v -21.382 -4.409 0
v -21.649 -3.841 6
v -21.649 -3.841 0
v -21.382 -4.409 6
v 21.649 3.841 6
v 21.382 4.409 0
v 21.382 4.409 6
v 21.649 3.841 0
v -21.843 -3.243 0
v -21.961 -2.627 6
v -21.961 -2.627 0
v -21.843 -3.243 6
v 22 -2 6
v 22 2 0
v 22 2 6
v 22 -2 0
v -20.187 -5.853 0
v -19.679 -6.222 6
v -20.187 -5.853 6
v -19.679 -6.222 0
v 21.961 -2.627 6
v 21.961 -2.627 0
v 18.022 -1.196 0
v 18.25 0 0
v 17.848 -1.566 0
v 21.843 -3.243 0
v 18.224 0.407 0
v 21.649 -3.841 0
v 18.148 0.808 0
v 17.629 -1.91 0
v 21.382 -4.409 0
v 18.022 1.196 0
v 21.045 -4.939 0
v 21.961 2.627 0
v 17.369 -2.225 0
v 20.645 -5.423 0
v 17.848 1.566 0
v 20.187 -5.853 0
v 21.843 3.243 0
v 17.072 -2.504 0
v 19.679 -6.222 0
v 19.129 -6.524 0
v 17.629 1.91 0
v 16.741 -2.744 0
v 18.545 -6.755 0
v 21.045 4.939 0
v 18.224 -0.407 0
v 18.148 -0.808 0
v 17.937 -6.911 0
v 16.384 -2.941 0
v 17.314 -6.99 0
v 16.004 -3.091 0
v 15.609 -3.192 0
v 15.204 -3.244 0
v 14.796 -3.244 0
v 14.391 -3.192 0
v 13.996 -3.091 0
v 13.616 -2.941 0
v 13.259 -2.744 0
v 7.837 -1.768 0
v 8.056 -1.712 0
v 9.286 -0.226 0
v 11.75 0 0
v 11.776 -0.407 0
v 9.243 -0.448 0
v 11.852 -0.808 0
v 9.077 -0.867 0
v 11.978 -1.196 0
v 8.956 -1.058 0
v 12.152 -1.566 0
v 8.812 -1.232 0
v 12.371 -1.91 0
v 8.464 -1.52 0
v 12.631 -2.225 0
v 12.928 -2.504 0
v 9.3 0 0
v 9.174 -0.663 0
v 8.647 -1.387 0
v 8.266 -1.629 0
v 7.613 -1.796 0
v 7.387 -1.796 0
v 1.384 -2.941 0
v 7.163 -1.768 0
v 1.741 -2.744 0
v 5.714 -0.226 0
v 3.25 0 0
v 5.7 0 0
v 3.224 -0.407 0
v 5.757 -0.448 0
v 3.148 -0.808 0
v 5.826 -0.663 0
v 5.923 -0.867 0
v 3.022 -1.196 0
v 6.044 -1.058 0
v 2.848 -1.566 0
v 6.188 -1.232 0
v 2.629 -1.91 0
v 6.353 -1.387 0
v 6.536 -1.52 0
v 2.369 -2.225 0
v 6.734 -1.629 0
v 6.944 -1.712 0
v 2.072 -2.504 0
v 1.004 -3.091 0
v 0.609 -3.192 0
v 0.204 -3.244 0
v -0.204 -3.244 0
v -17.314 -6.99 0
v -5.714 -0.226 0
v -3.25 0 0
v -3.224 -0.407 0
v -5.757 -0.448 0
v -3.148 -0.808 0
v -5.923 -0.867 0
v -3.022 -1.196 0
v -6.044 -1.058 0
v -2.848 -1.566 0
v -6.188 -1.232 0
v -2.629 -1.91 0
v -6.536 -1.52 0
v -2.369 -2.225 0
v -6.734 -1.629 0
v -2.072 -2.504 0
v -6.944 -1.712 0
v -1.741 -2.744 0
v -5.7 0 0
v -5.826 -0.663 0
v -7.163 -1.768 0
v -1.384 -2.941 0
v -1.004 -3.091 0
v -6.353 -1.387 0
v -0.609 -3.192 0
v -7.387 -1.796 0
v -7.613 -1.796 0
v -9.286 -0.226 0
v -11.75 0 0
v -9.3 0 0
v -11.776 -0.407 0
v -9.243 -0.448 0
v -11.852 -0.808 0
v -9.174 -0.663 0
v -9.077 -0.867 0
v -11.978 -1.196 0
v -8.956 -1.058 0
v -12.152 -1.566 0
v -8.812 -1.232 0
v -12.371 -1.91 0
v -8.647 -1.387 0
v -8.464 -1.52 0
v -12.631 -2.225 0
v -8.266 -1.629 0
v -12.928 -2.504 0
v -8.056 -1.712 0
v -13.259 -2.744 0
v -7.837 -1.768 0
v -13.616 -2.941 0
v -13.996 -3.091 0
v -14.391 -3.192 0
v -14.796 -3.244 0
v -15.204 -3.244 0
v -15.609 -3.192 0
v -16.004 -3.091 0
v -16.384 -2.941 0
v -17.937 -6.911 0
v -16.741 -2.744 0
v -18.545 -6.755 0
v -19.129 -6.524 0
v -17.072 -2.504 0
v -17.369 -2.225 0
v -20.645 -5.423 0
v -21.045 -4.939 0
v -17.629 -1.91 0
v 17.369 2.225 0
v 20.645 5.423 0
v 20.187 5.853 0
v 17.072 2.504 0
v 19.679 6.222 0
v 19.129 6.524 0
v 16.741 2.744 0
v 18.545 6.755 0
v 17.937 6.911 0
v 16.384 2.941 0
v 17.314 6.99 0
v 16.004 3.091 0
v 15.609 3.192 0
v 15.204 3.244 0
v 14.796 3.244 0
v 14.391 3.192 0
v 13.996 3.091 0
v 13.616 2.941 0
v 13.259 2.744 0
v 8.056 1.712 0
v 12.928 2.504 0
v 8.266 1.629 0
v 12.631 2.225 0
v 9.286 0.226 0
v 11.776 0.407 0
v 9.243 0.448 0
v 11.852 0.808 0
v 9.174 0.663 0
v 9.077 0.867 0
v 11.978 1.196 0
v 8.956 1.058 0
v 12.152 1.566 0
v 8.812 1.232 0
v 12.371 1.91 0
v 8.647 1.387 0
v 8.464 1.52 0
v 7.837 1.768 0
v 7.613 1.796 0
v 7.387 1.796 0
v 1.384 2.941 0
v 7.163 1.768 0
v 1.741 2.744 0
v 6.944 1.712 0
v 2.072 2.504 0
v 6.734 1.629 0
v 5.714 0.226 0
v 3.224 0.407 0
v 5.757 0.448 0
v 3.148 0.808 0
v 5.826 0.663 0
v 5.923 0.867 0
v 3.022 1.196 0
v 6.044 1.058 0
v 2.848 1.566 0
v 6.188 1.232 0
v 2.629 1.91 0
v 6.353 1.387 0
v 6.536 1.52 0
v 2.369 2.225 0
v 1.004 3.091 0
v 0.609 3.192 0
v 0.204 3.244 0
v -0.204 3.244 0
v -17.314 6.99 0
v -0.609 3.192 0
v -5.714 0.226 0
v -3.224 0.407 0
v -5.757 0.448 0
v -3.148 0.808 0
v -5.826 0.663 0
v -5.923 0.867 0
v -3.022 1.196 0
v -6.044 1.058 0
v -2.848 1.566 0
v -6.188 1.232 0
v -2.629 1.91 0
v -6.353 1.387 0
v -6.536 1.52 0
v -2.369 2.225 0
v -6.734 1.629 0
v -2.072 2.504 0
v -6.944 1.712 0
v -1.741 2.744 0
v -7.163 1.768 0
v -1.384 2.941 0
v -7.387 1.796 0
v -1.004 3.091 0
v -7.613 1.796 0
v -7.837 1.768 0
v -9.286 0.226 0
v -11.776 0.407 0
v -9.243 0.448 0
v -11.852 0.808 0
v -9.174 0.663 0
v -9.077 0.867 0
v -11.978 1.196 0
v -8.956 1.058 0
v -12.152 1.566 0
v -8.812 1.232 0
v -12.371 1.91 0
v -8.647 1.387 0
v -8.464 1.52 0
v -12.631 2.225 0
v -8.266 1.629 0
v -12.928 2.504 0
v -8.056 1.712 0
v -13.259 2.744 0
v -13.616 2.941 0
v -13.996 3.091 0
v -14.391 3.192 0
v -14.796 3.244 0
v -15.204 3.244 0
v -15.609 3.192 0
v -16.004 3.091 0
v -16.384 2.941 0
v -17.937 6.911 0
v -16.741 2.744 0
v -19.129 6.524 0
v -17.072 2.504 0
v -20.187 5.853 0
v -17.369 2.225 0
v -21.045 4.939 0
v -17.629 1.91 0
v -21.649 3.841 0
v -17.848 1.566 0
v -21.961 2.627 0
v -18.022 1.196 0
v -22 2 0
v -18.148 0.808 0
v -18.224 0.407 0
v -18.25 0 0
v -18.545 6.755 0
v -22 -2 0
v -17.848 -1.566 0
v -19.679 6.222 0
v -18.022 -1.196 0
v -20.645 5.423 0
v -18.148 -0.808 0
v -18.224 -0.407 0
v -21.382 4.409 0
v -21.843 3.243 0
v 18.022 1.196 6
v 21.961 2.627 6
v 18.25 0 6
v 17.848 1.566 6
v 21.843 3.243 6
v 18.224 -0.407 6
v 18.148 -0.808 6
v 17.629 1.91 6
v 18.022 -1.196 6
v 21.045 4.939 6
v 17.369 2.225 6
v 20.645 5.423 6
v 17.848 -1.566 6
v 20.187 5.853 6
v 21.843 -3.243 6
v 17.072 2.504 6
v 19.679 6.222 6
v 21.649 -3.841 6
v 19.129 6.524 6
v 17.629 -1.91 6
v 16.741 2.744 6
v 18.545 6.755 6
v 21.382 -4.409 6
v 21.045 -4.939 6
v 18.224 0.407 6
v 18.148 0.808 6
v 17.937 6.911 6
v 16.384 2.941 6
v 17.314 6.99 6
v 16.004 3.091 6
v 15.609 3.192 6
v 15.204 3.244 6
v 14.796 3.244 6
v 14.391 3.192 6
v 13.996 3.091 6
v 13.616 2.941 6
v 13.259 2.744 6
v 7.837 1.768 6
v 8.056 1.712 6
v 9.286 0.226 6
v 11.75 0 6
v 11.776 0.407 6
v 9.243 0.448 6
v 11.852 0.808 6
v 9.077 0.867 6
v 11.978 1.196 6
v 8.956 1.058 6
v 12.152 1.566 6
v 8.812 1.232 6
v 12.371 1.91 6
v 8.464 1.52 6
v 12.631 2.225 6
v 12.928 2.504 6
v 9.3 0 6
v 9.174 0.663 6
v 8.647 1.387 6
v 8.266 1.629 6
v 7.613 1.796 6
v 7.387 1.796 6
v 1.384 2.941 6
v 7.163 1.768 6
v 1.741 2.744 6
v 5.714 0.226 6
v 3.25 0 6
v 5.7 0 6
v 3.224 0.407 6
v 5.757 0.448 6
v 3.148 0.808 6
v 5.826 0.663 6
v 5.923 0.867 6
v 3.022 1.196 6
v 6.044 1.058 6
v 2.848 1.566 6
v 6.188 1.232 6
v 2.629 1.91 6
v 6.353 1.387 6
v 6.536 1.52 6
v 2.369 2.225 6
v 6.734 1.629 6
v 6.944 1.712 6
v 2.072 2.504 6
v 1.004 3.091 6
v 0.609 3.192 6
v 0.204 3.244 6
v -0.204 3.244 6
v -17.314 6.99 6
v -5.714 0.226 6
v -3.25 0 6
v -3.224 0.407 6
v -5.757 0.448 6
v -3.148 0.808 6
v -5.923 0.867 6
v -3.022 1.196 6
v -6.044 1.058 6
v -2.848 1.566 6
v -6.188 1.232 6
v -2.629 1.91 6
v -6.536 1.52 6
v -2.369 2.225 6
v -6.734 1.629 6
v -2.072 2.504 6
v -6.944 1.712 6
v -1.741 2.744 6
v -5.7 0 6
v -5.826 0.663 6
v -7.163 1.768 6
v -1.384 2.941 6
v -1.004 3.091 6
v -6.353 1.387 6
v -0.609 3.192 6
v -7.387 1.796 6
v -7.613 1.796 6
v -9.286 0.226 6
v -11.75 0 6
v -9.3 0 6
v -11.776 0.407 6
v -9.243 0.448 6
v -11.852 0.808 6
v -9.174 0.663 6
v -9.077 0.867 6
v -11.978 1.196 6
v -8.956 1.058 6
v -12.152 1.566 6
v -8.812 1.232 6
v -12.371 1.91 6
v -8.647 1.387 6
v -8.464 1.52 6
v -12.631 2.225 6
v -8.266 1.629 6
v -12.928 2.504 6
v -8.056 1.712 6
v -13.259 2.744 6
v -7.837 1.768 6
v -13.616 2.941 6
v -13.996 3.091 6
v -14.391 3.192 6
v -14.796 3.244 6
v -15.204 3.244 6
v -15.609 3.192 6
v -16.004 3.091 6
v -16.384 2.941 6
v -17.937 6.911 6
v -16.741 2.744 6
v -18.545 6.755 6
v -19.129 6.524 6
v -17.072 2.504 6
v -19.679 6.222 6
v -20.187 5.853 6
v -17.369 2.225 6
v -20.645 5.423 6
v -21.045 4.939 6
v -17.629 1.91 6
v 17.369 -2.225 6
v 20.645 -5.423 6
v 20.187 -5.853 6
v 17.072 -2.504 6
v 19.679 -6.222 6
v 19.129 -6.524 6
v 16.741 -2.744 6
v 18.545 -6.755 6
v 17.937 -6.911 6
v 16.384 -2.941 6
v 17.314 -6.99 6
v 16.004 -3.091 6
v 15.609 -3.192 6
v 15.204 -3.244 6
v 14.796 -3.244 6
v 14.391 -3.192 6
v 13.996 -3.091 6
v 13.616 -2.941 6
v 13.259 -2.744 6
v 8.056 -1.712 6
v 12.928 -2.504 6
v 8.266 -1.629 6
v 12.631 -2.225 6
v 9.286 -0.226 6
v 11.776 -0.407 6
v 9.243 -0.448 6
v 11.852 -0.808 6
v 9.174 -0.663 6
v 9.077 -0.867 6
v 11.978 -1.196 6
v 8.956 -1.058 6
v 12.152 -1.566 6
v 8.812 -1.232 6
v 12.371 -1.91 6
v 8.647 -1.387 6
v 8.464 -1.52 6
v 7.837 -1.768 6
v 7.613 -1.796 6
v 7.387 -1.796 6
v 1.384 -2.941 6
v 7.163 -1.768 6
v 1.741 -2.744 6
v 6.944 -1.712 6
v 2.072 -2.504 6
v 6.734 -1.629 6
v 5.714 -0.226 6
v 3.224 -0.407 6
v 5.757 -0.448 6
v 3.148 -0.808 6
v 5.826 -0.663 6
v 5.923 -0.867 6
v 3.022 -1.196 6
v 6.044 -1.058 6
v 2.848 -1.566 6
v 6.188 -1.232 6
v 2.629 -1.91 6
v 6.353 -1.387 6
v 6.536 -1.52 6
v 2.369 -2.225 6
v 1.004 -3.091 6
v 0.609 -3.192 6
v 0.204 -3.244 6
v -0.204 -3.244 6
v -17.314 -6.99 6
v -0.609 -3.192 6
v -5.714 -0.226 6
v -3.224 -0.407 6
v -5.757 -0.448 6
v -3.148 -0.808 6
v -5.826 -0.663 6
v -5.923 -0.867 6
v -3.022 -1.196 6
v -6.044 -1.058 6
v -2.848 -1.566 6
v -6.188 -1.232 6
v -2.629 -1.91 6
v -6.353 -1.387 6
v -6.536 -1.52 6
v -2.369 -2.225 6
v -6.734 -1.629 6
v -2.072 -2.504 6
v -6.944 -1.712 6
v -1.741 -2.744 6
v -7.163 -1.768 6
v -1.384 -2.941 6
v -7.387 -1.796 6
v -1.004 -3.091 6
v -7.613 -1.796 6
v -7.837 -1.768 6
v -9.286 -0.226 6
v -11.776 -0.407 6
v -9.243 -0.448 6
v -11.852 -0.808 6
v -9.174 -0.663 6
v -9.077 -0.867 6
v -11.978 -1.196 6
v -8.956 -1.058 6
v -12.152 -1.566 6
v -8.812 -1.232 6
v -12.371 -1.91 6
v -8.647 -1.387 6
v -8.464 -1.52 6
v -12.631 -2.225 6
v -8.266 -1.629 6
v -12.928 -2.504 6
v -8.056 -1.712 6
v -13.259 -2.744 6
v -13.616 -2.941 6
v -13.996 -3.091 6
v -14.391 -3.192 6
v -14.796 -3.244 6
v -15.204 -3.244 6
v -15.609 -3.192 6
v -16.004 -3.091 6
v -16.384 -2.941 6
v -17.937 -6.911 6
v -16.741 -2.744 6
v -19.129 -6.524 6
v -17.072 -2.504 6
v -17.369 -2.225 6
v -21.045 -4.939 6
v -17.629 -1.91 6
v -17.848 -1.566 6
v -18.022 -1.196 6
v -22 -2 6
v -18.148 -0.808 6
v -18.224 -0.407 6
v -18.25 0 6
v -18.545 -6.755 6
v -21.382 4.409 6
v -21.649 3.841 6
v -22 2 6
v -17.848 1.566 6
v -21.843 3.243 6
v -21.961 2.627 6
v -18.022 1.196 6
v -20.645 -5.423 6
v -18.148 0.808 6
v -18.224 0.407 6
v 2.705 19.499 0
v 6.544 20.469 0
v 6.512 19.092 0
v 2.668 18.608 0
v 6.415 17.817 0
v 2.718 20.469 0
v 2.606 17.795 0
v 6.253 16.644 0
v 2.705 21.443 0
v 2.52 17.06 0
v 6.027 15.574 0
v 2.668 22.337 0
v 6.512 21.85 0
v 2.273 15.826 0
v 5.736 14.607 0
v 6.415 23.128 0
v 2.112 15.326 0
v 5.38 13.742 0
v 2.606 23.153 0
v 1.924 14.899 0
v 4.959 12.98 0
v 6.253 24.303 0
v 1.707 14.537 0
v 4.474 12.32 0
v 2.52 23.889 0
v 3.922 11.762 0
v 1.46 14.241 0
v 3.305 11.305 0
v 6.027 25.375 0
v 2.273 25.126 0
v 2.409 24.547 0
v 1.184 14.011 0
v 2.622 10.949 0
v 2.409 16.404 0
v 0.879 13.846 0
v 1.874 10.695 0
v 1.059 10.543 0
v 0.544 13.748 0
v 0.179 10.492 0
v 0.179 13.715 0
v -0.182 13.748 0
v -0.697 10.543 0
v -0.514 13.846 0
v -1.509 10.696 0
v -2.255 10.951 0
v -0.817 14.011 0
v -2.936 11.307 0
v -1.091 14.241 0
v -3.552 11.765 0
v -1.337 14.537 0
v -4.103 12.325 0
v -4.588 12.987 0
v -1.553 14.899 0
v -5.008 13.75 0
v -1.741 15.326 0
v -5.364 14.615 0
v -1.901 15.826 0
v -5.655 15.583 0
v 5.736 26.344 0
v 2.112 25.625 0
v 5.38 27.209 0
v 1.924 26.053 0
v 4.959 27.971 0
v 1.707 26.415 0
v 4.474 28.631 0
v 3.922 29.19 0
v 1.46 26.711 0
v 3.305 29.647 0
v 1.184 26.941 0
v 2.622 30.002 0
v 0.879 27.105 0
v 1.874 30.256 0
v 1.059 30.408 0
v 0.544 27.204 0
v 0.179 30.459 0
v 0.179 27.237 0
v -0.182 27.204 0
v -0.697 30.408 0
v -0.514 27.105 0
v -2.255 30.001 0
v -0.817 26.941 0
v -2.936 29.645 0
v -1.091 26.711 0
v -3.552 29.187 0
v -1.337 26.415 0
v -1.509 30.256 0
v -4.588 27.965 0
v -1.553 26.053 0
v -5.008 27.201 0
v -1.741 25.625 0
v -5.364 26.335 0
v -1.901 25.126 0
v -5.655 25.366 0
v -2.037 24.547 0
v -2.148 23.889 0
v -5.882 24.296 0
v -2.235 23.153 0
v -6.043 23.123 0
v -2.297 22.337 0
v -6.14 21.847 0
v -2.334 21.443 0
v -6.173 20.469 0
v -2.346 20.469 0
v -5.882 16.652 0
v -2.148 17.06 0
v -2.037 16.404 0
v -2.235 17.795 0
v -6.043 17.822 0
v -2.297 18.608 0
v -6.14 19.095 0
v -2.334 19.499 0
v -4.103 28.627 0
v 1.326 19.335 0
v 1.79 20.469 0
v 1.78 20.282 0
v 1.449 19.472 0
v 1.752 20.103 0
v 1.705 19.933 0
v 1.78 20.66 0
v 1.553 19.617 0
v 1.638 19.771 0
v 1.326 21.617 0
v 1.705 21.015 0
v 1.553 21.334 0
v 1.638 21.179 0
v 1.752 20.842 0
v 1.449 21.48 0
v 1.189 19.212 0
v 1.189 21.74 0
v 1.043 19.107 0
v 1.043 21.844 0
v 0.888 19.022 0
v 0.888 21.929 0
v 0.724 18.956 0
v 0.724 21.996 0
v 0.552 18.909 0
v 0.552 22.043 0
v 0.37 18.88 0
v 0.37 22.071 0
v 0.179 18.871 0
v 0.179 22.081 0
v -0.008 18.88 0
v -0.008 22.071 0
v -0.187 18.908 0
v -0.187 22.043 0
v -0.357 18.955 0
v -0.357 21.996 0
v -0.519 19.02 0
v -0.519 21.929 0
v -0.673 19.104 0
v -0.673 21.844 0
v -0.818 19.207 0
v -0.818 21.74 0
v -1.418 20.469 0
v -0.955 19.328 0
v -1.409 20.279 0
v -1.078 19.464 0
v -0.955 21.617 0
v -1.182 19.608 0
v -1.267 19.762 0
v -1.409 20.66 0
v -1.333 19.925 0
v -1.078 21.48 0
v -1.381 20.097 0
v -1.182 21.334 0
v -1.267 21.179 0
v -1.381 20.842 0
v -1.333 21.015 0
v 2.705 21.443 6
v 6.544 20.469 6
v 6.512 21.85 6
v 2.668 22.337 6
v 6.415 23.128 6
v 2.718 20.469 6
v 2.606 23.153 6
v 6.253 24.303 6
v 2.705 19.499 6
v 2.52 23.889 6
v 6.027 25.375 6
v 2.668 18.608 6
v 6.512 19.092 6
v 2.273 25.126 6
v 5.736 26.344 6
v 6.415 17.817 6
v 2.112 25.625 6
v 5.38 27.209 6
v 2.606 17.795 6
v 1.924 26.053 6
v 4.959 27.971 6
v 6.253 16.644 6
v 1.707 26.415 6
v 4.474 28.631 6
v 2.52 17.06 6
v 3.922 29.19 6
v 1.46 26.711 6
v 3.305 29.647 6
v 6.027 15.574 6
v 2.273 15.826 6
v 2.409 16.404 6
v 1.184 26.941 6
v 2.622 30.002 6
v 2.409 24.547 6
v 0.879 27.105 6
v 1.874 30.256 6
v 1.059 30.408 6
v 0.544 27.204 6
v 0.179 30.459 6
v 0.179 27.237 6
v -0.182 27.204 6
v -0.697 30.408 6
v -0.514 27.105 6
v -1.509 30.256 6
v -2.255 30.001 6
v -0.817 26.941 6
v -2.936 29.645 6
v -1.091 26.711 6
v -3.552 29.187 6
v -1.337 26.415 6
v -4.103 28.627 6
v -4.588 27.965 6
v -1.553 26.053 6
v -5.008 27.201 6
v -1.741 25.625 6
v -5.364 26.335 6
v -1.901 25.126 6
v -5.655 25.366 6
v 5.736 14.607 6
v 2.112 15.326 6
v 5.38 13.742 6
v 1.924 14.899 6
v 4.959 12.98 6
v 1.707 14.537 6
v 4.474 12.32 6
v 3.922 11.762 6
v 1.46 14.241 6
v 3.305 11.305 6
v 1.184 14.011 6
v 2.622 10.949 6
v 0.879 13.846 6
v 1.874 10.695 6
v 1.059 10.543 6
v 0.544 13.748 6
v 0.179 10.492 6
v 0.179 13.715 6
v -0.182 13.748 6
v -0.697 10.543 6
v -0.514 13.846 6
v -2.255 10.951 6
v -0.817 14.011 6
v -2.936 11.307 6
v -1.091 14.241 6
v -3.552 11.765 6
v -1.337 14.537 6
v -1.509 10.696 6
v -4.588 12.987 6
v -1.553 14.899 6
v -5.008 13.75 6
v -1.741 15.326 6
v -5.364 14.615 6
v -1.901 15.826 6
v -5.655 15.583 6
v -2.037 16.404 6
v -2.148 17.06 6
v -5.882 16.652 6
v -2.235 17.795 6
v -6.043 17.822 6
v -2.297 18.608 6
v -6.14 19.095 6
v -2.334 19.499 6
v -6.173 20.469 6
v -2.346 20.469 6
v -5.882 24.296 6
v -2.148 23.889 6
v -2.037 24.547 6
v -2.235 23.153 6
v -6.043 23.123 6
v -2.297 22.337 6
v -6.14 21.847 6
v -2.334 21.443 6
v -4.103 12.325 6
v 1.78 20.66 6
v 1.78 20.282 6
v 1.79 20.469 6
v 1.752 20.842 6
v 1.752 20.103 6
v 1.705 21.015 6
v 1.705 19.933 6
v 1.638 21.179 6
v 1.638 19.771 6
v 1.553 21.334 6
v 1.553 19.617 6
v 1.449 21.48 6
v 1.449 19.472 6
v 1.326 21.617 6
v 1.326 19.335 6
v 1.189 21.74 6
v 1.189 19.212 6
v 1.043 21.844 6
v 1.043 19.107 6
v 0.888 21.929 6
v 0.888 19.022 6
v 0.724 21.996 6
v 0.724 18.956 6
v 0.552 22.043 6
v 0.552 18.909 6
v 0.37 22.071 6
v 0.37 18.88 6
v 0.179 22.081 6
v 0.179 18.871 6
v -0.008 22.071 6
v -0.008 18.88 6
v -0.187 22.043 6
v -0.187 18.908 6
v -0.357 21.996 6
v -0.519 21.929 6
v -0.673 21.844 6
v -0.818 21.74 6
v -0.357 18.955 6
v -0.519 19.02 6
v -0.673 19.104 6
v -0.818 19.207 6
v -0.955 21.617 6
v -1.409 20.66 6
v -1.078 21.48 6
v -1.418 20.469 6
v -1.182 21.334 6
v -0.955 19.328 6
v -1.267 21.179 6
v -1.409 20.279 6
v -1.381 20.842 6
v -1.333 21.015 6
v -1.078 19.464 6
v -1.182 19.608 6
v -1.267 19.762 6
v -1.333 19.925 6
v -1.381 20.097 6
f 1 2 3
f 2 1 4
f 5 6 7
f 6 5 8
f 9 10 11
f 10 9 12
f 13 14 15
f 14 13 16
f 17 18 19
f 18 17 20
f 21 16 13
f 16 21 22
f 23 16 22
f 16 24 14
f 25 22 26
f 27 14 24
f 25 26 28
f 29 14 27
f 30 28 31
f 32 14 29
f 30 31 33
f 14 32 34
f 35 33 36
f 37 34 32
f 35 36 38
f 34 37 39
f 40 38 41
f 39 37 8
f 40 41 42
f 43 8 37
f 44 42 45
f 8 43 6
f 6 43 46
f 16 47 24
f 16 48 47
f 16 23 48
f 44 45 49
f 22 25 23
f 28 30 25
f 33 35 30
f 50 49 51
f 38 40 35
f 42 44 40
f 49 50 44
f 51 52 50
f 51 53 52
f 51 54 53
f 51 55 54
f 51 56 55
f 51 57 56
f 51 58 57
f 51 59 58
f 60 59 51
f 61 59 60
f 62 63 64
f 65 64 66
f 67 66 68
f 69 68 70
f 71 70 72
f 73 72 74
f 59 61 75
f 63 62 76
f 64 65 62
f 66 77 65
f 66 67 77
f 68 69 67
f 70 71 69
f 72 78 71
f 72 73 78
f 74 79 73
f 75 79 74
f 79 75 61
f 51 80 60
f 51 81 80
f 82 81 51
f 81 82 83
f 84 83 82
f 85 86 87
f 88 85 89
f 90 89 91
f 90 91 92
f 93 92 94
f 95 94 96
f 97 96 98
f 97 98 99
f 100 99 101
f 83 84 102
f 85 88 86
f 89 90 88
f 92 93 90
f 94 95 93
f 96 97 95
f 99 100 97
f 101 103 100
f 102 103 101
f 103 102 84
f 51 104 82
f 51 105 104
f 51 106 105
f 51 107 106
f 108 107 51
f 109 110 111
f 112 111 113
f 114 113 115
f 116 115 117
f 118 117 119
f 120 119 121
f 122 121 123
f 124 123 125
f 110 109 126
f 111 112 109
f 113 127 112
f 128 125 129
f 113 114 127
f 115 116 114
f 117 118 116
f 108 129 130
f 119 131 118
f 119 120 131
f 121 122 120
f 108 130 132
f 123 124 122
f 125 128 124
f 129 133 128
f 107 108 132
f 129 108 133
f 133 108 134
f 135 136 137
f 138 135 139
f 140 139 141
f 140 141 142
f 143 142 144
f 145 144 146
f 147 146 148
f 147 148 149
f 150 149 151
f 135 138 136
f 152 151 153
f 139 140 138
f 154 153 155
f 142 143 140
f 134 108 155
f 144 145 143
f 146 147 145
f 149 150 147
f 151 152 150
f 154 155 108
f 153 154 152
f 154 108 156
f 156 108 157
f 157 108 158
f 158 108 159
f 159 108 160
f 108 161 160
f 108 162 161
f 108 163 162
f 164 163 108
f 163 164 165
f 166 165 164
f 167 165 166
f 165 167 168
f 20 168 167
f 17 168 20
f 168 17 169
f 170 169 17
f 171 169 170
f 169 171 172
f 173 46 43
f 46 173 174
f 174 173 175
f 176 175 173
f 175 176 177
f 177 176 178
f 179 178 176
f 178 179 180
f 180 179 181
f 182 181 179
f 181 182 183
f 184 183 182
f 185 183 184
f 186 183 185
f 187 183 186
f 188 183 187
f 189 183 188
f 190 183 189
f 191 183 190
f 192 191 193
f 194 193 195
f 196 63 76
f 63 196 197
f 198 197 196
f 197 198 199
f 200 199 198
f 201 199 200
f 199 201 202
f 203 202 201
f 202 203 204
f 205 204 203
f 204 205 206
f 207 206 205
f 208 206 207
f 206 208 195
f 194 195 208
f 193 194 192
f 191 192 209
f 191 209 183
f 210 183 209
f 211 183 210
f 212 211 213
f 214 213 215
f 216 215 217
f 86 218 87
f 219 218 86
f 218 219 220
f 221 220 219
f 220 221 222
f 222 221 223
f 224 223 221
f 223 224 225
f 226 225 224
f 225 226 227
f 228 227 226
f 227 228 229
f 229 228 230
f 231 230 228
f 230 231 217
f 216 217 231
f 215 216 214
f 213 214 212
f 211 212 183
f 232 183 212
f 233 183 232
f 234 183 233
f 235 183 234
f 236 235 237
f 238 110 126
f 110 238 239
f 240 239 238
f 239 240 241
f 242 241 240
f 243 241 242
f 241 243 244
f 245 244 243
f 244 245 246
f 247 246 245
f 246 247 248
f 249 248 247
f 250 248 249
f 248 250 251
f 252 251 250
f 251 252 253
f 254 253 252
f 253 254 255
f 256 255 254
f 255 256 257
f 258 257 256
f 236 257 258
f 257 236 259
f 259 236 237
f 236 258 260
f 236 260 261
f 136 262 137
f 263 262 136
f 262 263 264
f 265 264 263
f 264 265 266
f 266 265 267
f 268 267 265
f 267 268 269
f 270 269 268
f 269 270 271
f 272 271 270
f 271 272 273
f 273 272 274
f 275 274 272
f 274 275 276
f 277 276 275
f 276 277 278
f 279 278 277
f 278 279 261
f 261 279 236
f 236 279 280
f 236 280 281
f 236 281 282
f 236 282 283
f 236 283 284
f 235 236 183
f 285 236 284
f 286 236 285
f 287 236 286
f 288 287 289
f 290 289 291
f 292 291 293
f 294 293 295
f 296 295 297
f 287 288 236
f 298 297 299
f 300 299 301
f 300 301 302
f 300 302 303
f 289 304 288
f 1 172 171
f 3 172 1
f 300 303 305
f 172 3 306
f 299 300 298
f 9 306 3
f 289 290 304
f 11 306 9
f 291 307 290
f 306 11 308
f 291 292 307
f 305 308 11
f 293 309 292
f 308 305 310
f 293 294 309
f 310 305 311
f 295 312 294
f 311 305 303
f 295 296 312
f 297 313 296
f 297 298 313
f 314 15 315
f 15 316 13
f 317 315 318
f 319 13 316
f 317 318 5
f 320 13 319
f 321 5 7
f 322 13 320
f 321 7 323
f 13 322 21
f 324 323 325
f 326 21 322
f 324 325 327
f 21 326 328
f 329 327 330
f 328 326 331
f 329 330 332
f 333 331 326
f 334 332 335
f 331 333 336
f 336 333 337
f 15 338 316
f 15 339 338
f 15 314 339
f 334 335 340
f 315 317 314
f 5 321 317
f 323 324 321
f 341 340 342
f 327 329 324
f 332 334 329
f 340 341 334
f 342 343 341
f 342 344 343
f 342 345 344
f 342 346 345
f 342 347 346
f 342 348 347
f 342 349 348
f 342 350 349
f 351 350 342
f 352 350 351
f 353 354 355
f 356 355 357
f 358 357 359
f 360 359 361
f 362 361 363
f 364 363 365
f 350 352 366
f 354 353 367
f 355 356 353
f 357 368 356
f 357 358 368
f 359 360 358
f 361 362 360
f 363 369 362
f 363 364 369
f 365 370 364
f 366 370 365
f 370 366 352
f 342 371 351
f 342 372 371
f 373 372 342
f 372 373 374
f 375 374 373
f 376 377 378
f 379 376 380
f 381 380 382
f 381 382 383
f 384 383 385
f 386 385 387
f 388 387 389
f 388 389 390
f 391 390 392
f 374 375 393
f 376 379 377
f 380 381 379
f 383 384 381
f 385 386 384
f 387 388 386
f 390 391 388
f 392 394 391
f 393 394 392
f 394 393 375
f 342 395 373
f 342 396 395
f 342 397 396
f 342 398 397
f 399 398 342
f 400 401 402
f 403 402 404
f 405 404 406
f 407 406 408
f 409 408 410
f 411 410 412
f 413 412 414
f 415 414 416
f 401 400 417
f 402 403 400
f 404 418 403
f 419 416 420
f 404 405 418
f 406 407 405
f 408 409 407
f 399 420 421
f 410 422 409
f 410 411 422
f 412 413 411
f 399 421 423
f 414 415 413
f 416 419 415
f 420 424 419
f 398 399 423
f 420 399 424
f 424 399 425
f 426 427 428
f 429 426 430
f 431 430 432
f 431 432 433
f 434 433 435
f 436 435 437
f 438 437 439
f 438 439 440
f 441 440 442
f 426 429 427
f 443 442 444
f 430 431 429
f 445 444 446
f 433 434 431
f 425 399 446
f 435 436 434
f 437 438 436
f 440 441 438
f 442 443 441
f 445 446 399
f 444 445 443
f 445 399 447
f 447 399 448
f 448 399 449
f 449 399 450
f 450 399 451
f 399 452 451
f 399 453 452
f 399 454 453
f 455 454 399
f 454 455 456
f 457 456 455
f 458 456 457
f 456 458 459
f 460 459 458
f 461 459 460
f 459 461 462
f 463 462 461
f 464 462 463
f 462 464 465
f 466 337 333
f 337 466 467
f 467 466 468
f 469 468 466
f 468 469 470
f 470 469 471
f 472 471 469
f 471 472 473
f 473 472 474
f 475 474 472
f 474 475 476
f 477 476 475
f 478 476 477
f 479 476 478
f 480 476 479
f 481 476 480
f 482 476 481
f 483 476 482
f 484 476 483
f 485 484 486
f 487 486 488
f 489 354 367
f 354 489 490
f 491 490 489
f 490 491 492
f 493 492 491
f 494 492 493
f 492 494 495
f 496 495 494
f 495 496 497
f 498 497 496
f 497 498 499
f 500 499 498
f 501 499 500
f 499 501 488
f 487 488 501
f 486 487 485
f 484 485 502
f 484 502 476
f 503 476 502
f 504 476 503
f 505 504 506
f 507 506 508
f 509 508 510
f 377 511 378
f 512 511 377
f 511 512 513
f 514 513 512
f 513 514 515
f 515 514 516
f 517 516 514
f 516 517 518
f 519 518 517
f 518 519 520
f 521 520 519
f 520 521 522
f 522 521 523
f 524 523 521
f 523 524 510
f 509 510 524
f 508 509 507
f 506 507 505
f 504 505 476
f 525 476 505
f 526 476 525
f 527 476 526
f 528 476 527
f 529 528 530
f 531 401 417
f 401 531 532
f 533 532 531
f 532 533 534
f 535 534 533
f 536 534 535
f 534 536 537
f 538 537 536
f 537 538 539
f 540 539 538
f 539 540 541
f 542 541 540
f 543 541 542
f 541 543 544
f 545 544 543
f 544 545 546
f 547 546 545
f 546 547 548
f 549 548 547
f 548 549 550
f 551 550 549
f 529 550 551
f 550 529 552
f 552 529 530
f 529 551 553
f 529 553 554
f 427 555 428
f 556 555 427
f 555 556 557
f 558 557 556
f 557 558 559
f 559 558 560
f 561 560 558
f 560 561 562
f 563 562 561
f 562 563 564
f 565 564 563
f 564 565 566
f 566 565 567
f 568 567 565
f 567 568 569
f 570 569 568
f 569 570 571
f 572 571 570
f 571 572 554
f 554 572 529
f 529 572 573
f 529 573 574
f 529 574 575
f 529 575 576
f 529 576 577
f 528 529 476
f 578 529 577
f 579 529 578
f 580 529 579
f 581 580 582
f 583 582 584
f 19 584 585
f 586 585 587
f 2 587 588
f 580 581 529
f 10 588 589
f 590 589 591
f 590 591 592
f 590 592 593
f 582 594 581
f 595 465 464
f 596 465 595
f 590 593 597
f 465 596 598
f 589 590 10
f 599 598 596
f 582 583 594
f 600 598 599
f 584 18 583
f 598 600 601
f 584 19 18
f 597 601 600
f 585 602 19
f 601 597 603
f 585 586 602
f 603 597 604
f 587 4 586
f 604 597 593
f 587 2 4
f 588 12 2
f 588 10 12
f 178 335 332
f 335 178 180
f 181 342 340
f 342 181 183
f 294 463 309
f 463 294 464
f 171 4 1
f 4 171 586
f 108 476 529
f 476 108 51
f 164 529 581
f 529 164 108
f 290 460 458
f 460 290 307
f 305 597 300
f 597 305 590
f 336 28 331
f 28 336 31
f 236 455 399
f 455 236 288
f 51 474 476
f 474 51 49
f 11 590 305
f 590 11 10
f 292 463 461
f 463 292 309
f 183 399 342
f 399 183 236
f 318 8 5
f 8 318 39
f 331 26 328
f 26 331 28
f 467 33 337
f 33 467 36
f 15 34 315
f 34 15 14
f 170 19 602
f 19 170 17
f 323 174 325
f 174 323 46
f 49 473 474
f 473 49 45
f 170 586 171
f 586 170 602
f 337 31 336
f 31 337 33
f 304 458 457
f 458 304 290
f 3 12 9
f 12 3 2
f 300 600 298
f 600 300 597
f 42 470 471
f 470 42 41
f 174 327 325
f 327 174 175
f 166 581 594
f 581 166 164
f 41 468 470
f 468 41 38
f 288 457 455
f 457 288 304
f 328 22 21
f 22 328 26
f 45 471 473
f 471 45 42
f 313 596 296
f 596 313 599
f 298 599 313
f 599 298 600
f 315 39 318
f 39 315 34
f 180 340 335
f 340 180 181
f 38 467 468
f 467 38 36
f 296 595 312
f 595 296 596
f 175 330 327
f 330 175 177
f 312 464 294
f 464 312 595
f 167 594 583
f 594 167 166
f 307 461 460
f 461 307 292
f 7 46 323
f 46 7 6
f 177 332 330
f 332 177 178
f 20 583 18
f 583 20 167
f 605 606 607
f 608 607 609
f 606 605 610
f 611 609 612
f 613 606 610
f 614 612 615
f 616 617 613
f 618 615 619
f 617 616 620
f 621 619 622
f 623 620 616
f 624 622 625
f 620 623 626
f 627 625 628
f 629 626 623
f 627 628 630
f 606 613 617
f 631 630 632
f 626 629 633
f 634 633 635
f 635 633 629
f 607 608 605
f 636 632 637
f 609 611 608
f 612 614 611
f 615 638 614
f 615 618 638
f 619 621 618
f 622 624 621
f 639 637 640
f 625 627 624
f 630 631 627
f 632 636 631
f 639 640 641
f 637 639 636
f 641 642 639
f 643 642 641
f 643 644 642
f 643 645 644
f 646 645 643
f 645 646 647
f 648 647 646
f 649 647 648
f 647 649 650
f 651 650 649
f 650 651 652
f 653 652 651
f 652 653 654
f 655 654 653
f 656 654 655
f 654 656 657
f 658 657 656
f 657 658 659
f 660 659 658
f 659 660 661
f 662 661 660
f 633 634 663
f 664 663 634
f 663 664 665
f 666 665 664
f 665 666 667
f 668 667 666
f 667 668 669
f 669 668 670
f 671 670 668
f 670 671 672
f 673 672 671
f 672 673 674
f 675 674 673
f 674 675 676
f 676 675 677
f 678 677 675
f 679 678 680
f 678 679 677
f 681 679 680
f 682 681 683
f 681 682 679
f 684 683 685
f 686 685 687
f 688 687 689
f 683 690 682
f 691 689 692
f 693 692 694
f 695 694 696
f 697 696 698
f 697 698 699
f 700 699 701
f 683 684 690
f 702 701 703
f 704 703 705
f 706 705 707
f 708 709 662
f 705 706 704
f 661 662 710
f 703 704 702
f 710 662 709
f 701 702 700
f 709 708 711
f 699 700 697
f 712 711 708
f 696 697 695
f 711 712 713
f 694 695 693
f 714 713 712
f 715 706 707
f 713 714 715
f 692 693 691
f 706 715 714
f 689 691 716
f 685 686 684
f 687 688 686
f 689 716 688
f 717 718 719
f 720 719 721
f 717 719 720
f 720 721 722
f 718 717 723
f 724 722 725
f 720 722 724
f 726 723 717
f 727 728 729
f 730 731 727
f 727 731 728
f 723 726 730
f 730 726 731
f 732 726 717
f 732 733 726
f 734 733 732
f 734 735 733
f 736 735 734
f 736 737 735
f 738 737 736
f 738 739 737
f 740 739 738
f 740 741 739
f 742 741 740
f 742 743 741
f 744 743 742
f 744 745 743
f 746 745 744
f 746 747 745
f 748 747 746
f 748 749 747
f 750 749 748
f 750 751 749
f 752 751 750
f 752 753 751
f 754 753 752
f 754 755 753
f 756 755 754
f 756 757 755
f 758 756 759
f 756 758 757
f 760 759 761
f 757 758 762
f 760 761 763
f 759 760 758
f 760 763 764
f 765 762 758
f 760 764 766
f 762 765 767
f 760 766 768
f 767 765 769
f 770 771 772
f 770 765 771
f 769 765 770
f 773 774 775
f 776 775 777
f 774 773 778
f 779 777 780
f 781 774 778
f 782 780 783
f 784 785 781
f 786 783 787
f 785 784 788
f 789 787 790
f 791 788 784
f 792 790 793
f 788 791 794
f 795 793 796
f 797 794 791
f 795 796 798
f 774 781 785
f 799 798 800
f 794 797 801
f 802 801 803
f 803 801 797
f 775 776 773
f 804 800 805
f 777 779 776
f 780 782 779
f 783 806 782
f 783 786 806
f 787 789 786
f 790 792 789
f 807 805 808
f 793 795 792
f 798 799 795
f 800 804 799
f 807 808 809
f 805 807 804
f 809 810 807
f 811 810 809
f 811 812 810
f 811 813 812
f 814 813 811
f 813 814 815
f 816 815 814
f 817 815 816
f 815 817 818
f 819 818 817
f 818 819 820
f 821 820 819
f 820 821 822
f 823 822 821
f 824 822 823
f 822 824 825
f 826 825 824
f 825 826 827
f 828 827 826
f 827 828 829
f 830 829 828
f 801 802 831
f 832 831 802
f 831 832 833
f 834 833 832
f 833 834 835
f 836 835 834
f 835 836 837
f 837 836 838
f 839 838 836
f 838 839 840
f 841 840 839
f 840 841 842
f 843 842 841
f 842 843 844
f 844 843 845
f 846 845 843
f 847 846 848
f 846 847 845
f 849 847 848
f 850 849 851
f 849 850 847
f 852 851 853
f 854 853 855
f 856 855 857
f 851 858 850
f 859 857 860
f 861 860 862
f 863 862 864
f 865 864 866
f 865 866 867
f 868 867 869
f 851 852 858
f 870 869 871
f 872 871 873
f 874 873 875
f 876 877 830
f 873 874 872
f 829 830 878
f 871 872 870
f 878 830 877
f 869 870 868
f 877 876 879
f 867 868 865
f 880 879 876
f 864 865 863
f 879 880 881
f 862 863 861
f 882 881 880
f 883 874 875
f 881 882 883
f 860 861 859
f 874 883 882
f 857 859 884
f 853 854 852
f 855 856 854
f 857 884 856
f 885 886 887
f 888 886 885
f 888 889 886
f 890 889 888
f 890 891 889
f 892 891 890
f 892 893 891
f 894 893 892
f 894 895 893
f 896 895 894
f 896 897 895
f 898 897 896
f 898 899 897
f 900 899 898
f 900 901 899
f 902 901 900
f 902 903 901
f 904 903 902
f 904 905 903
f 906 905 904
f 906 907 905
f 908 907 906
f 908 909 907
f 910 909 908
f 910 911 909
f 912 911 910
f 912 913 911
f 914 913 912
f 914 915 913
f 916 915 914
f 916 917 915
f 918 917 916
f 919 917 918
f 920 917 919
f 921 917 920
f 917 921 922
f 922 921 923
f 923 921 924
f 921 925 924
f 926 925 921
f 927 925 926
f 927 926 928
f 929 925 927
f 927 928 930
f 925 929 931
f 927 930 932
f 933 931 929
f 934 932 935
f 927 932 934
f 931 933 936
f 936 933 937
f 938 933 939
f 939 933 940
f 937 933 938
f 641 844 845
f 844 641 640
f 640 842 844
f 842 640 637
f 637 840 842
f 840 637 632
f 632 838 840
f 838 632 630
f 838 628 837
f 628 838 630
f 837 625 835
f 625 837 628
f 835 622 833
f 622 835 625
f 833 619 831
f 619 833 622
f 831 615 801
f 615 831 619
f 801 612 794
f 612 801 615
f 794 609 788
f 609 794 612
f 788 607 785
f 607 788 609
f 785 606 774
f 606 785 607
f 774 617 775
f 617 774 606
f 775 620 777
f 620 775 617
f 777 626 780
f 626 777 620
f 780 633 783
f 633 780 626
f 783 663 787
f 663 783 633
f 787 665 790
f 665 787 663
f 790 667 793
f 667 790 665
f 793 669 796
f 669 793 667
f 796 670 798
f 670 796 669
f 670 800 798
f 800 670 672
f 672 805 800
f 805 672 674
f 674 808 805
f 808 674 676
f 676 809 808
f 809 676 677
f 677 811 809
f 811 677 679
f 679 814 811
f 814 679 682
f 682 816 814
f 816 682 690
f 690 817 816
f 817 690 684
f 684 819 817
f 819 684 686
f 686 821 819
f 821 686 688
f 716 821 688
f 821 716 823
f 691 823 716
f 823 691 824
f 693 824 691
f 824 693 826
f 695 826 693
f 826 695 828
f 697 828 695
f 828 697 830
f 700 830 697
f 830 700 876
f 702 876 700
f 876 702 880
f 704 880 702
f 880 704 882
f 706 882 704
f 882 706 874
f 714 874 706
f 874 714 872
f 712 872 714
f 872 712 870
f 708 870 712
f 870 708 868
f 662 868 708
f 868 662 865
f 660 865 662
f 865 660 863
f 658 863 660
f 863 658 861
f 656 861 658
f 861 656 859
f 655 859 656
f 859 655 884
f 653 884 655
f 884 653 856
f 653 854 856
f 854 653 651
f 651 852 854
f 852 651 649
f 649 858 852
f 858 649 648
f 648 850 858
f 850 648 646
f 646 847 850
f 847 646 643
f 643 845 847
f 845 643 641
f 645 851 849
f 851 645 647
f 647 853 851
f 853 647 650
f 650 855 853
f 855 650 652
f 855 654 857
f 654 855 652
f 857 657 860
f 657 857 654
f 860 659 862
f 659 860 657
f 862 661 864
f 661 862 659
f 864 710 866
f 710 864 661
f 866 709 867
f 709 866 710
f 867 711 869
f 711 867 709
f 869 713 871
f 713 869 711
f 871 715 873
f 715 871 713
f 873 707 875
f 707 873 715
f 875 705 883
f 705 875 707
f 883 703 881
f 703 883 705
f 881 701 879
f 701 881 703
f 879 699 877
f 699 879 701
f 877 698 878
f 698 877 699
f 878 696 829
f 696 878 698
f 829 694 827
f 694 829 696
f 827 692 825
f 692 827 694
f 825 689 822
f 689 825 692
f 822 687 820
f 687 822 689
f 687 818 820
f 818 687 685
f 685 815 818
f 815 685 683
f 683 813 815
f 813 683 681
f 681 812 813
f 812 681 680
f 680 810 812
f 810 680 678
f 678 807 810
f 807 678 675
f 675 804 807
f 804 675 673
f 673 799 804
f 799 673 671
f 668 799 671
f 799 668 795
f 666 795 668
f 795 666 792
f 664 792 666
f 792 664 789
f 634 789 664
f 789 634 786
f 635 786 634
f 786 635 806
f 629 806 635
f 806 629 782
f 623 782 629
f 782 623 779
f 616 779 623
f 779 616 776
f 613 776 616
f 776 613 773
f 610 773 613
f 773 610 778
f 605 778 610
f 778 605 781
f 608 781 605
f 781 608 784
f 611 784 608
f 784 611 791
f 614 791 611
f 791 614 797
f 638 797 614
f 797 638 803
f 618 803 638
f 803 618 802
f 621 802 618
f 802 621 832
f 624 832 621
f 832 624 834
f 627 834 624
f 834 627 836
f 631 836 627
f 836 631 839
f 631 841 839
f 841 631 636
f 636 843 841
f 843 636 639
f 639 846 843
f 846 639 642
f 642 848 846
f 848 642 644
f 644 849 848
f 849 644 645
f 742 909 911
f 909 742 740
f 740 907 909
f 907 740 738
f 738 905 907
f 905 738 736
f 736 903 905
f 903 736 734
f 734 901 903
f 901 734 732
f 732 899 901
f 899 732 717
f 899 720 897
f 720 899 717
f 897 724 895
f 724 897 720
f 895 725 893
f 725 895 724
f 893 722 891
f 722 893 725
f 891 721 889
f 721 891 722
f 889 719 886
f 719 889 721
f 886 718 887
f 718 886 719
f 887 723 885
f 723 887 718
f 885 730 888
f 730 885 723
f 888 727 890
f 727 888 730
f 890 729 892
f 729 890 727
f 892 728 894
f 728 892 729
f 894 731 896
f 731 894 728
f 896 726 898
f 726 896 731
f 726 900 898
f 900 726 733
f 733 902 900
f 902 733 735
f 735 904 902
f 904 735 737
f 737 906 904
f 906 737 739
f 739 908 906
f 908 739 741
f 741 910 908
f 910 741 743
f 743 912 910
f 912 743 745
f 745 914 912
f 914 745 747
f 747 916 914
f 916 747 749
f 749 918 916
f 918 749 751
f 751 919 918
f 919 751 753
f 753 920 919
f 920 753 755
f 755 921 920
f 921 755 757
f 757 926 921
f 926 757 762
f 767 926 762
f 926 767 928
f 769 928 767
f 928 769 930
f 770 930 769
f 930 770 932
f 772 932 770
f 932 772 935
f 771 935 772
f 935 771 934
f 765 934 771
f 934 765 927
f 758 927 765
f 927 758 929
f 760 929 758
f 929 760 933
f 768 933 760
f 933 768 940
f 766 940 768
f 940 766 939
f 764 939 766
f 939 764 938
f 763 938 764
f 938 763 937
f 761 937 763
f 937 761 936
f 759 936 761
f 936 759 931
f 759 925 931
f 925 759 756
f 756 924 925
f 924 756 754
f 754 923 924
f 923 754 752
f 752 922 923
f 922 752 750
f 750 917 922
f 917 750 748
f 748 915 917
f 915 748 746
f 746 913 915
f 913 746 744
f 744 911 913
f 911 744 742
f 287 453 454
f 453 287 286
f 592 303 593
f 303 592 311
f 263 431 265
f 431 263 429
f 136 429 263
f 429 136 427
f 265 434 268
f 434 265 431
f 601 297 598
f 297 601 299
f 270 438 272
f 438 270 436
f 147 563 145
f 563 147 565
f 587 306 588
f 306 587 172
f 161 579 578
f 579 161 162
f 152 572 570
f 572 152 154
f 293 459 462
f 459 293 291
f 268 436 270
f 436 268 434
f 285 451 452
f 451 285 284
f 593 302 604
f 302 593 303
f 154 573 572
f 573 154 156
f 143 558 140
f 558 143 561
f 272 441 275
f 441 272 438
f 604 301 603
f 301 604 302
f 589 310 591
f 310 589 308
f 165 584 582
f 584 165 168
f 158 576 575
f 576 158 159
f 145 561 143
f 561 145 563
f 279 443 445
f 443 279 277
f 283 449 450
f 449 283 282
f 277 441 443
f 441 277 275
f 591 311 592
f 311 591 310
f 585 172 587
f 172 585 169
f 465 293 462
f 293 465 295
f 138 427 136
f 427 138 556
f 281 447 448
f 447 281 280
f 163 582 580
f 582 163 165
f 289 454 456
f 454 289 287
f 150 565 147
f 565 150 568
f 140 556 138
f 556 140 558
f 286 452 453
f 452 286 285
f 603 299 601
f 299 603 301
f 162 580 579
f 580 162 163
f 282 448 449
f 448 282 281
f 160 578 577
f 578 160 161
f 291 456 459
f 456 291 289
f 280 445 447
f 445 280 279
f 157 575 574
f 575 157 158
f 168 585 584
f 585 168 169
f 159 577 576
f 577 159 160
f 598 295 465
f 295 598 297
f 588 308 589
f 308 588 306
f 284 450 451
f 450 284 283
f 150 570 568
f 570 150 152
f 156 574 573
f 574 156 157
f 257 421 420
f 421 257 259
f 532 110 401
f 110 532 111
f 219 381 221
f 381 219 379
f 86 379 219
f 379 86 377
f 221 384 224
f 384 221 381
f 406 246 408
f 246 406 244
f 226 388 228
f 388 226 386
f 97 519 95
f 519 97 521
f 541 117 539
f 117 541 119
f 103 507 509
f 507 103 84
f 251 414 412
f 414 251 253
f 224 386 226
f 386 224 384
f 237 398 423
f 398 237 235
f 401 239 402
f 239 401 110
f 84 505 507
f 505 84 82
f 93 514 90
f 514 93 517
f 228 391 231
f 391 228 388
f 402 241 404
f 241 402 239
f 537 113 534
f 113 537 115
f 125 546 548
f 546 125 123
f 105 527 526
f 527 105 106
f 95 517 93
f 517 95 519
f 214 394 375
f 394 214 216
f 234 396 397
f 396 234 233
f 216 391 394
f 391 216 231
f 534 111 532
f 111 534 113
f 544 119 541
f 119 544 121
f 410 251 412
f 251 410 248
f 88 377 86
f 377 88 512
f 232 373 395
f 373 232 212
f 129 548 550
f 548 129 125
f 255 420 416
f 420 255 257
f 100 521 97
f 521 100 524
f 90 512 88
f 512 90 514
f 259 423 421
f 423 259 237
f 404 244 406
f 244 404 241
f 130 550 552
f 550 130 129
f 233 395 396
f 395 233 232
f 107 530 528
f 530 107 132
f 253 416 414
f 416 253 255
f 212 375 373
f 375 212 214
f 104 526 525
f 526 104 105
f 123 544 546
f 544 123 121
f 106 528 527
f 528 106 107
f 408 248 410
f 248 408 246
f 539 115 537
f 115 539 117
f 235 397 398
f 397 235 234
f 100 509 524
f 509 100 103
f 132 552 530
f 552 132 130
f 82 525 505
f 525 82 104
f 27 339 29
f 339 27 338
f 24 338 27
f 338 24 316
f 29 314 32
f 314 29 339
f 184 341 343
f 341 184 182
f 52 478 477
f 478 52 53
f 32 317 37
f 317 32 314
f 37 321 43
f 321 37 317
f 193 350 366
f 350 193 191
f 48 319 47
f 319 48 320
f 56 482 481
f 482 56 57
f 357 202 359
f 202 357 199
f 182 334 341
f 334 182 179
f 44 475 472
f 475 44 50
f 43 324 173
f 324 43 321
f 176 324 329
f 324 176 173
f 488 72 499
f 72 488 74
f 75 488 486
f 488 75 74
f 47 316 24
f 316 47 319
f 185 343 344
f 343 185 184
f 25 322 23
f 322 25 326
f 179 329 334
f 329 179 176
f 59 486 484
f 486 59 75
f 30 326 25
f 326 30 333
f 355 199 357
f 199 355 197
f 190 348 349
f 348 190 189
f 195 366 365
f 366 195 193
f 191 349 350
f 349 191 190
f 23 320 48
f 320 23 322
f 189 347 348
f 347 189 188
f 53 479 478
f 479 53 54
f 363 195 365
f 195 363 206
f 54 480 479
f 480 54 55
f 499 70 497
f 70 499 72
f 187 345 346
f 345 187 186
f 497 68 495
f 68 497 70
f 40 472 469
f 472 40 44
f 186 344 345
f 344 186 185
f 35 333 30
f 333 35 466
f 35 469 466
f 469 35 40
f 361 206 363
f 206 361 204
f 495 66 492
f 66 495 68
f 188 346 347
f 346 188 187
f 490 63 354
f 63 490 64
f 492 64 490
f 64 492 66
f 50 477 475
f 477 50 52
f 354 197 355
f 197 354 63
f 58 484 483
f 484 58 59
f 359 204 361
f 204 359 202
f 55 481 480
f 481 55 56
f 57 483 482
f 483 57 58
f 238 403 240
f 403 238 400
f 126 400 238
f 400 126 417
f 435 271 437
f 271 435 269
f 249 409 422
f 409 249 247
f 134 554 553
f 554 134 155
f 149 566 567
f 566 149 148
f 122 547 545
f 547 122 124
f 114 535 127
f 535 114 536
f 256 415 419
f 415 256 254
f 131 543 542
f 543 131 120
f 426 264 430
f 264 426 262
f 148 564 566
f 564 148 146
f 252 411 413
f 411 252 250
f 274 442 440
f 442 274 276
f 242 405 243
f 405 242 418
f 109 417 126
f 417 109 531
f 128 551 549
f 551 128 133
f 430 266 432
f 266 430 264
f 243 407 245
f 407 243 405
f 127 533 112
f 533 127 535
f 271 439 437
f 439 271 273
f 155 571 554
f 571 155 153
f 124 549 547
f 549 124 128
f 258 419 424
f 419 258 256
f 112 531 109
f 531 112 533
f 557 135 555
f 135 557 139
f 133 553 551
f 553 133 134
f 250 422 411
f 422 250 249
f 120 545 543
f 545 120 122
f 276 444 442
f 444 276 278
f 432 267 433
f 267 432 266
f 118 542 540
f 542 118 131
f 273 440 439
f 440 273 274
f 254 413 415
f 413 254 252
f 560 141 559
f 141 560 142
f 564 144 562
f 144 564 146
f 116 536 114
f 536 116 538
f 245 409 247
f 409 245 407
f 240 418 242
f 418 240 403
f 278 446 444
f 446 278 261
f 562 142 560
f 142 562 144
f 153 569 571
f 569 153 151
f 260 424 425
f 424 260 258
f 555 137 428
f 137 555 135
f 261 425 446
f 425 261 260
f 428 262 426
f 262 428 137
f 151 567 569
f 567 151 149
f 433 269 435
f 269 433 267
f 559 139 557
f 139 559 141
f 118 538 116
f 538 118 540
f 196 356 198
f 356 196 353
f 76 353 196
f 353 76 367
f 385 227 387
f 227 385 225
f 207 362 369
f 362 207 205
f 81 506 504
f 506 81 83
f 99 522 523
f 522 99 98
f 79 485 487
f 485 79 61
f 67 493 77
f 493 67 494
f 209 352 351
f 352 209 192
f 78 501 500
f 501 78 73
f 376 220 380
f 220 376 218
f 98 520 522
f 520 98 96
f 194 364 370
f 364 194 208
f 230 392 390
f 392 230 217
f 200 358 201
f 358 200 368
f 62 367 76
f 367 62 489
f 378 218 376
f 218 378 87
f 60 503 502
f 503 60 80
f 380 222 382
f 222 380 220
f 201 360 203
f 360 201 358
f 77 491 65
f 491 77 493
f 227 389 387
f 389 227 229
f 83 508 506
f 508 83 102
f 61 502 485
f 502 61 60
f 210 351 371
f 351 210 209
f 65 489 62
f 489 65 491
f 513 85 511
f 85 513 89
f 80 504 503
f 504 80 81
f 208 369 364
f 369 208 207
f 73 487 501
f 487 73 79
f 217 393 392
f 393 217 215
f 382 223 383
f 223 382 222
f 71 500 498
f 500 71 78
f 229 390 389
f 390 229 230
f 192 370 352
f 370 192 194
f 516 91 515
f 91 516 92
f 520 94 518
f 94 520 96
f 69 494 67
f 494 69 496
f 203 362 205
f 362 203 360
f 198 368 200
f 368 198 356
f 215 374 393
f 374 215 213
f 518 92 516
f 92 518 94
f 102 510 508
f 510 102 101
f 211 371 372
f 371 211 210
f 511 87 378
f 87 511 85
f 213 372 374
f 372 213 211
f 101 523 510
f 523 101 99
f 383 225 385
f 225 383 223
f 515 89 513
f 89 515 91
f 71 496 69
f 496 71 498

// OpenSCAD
$fn = 50;


difference() {
	union() {
		hull() {
			translate(v = [-17.0000000000, 2.0000000000, 0]) {
				cylinder(h = 6, r = 5);
			}
			translate(v = [17.0000000000, 2.0000000000, 0]) {
				cylinder(h = 6, r = 5);
			}
			translate(v = [-17.0000000000, -2.0000000000, 0]) {
				cylinder(h = 6, r = 5);
			}
			translate(v = [17.0000000000, -2.0000000000, 0]) {
				cylinder(h = 6, r = 5);
			}
		}
		translate(v = [0, 30.0000000000, 0]) {
			linear_extrude(height = 6) {
				text(font = "DejaVu Sans Mono:style=Bold", halign = "center", size = 19.0000000000, text = "0", valign = "top");
			}
		}
	}
	union() {
		translate(v = [-15.0000000000, 0.0000000000, 0]) {
			translate(v = [0, 0, -100]) {
				cylinder(h = 200, r = 3.2500000000);
			}
		}
		translate(v = [0, 0, -100]) {
			cylinder(h = 200, r = 3.2500000000);
		}
		translate(v = [15.0000000000, 0.0000000000, 0]) {
			translate(v = [0, 0, -100]) {
				cylinder(h = 200, r = 3.2500000000);
			}
		}
		translate(v = [-15.0000000000, 0.0000000000, 0]) {
			translate(v = [0, 0, -100]) {
				cylinder(h = 200, r = 1.8000000000);
			}
		}
		translate(v = [-7.5000000000, 0.0000000000, 0]) {
			translate(v = [0, 0, -100]) {
				cylinder(h = 200, r = 1.8000000000);
			}
		}
		translate(v = [0, 0, -100]) {
			cylinder(h = 200, r = 1.8000000000);
		}
		translate(v = [7.5000000000, 0.0000000000, 0]) {
			translate(v = [0, 0, -100]) {
				cylinder(h = 200, r = 1.8000000000);
			}
		}
		translate(v = [15.0000000000, 0.0000000000, 0]) {
			translate(v = [0, 0, -100]) {
				cylinder(h = 200, r = 1.8000000000);
			}
		}
	}
}
